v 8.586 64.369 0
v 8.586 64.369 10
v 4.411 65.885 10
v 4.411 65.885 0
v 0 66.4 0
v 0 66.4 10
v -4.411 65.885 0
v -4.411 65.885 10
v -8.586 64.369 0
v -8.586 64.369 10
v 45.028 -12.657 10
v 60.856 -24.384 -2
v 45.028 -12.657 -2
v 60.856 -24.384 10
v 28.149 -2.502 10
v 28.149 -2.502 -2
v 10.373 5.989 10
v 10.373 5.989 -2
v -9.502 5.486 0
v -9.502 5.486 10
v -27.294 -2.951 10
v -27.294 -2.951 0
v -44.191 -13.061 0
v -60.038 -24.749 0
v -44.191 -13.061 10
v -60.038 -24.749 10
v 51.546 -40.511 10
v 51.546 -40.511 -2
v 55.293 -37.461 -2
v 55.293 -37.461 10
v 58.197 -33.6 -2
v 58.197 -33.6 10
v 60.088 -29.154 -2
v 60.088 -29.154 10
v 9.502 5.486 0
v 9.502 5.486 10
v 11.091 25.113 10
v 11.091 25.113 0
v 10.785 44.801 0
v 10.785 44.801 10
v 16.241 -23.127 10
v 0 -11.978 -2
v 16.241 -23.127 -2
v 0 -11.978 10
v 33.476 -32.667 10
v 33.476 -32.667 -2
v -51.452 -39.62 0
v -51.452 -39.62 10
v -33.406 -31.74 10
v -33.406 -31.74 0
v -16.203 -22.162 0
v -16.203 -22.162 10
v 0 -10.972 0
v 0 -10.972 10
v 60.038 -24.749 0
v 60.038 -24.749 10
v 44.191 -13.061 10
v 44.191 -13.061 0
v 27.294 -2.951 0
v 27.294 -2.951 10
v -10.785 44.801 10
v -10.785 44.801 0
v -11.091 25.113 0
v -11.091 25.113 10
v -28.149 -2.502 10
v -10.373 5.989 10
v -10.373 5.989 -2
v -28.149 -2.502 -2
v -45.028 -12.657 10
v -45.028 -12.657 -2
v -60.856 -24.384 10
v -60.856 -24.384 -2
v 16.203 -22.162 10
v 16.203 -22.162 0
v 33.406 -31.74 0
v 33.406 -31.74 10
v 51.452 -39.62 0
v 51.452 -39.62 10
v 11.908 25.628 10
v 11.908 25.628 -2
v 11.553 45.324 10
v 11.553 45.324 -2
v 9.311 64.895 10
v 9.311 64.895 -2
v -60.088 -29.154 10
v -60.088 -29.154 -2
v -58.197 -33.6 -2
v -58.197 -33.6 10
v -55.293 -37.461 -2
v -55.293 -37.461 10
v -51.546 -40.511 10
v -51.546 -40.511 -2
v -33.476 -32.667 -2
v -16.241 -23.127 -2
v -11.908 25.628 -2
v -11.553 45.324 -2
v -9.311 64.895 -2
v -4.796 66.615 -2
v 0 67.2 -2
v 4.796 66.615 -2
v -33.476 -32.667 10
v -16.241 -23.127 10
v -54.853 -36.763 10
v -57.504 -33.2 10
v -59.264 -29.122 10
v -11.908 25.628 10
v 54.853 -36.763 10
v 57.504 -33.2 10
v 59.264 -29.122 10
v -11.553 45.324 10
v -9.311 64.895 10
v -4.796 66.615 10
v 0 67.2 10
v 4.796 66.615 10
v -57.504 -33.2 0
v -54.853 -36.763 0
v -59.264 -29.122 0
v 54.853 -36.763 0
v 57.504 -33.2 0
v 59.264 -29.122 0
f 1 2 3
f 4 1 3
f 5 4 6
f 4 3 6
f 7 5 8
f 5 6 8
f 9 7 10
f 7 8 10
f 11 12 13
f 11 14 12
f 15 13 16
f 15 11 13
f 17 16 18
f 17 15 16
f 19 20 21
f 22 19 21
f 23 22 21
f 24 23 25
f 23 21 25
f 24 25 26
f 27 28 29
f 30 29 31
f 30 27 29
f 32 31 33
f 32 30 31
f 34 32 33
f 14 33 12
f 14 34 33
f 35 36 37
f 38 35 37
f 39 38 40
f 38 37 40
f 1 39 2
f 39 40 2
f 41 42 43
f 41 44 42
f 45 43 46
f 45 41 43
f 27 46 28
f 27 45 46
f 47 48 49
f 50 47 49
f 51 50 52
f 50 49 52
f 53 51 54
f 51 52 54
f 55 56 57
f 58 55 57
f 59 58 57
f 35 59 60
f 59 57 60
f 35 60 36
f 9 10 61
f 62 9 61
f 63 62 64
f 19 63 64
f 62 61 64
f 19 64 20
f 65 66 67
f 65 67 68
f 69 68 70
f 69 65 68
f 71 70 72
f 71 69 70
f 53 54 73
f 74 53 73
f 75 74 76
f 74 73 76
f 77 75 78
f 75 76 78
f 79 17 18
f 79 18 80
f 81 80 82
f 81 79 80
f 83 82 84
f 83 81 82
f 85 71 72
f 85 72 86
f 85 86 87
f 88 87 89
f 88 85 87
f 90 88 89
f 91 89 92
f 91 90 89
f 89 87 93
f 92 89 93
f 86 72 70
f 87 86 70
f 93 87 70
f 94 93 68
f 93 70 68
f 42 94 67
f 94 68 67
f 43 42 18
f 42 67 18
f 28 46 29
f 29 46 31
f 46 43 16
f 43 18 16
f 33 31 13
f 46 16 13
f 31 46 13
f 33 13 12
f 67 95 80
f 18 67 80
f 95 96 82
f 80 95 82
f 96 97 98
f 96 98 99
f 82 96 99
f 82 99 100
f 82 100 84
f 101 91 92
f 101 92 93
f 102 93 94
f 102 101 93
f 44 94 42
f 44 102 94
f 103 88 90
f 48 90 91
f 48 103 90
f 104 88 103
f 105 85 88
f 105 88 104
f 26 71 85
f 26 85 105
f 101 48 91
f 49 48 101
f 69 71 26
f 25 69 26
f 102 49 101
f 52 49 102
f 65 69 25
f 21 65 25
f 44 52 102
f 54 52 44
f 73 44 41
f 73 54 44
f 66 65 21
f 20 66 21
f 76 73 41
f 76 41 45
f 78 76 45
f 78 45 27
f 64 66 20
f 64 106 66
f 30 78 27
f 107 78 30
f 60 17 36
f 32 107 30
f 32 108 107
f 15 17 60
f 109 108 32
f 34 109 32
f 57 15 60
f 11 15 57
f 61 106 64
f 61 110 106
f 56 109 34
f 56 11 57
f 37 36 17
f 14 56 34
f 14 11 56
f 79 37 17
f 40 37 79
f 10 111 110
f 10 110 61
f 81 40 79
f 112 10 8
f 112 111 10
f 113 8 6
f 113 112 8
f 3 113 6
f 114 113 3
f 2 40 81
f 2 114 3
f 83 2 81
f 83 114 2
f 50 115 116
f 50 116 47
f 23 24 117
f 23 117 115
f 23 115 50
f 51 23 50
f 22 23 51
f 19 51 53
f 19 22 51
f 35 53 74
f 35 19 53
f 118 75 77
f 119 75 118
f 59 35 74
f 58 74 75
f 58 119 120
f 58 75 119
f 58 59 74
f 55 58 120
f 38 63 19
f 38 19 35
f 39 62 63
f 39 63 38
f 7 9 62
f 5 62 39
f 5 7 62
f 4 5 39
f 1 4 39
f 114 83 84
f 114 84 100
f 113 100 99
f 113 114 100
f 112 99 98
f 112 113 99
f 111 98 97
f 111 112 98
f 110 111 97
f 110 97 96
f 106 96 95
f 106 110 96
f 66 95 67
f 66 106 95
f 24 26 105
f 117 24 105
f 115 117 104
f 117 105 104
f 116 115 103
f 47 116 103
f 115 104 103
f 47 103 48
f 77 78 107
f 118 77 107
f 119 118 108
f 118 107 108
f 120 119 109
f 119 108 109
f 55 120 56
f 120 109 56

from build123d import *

# Parameters (mm, degrees)
F1_DEPTH = 10
F3_DEPTH = 10
F0_R     = 7.5
F4_DEPTH = 2


with BuildPart() as f1:
    # F0 (on Top) → F1 (new body)
    with BuildSketch(Plane.XY):
        with BuildLine():
            ThreePointArc((60.856366, -24.384369), (36.710284, -7.376819), (10.3731, 5.988912))
            ThreePointArc((10.3731, 5.988912), (11.966629, 35.480448), (9.3107, 64.895344))
            ThreePointArc((9.3107, 64.895344), (0, 67.2), (-9.3107, 64.895344))
            ThreePointArc((-9.3107, 64.895344), (-11.966629, 35.480448), (-10.3731, 5.988912))
            ThreePointArc((-10.3731, 5.988912), (-36.710284, -7.376819), (-60.856366, -24.384369))
            ThreePointArc((-60.856366, -24.384369), (-58.196907, -33.6), (-51.545666, -40.510974))
            ThreePointArc((-51.545666, -40.510974), (-24.743655, -28.103629), (0, -11.977824))
            ThreePointArc((0, -11.977824), (24.743655, -28.103629), (51.545666, -40.510974))
            ThreePointArc((51.545666, -40.510974), (58.196907, -33.6), (60.856366, -24.384369))
        make_face()
        with BuildLine():
            ThreePointArc((-7.5, 63.559028), (0, 65.2), (7.5, 63.559028))
            ThreePointArc((7.5, 63.559028), (9.985947, 34.169463), (8.191847, 4.729565))
            ThreePointArc((8.191847, 4.729565), (34.584597, -8.436648), (58.793733, -25.284323))
            ThreePointArc((58.793733, -25.284323), (56.464856, -32.6), (51.293733, -38.274704))
            ThreePointArc((51.293733, -38.274704), (24.59865, -25.732816), (0, -9.45913))
            ThreePointArc((0, -9.45913), (-24.59865, -25.732816), (-51.293733, -38.274704))
            ThreePointArc((-51.293733, -38.274704), (-56.464856, -32.6), (-58.793733, -25.284323))
            ThreePointArc((-58.793733, -25.284323), (-34.584597, -8.436648), (-8.191847, 4.729565))
            ThreePointArc((-8.191847, 4.729565), (-9.985947, 34.169463), (-7.5, 63.559028))
        make_face(mode=Mode.SUBTRACT)
    extrude(amount=F1_DEPTH)

    # F2 (on face) → F3 (cut)
    with BuildSketch(Plane.XY.offset(10)):
        with BuildLine():
            ThreePointArc((-8.585798, 64.368588), (-11.175251, 34.960479), (-9.502098, 5.486039))
            ThreePointArc((-9.502098, 5.486039), (-35.864289, -7.802188), (-60.037731, -24.748774))
            ThreePointArc((-60.037731, -24.748774), (-57.504087, -33.2), (-51.451933, -39.619813))
            ThreePointArc((-51.451933, -39.619813), (-24.689038, -27.158291), (0, -10.972078))
            ThreePointArc((0, -10.972078), (24.689038, -27.158291), (51.451933, -39.619813))
            ThreePointArc((51.451933, -39.619813), (57.504087, -33.2), (60.037731, -24.748774))
            ThreePointArc((60.037731, -24.748774), (35.864289, -7.802188), (9.502098, 5.486039))
            ThreePointArc((9.502098, 5.486039), (11.175251, 34.960479), (8.585798, 64.368588))
            ThreePointArc((8.585798, 64.368588), (0, 66.4), (-8.585798, 64.368588))
        make_face()
        with BuildLine():
            ThreePointArc((7.5, 63.559028), (9.985947, 34.169463), (8.191847, 4.729565))
            ThreePointArc((8.191847, 4.729565), (34.584597, -8.436648), (58.793733, -25.284323))
            ThreePointArc((58.793733, -25.284323), (56.464856, -32.6), (51.293733, -38.274704))
            ThreePointArc((51.293733, -38.274704), (24.59865, -25.732816), (0, -9.45913))
            ThreePointArc((0, -9.45913), (-24.59865, -25.732816), (-51.293733, -38.274704))
            ThreePointArc((-51.293733, -38.274704), (-56.464856, -32.6), (-58.793733, -25.284323))
            ThreePointArc((-58.793733, -25.284323), (-34.584597, -8.436648), (-8.191847, 4.729565))
            ThreePointArc((-8.191847, 4.729565), (-9.985947, 34.169463), (-7.5, 63.559028))
            ThreePointArc((-7.5, 63.559028), (0, 65.2), (7.5, 63.559028))
        make_face(mode=Mode.SUBTRACT)
    extrude(amount=-F3_DEPTH, mode=Mode.SUBTRACT)

    # F0 (on Top) → F4 (join)
    with BuildSketch(Plane.XY):
        with BuildLine():
            ThreePointArc((60.856366, -24.384369), (36.710284, -7.376819), (10.3731, 5.988912))
            ThreePointArc((10.3731, 5.988912), (11.966629, 35.480448), (9.3107, 64.895344))
            ThreePointArc((9.3107, 64.895344), (0, 67.2), (-9.3107, 64.895344))
            ThreePointArc((-9.3107, 64.895344), (-11.966629, 35.480448), (-10.3731, 5.988912))
            ThreePointArc((-10.3731, 5.988912), (-36.710284, -7.376819), (-60.856366, -24.384369))
            ThreePointArc((-60.856366, -24.384369), (-58.196907, -33.6), (-51.545666, -40.510974))
            ThreePointArc((-51.545666, -40.510974), (-24.743655, -28.103629), (0, -11.977824))
            ThreePointArc((0, -11.977824), (24.743655, -28.103629), (51.545666, -40.510974))
            ThreePointArc((51.545666, -40.510974), (58.196907, -33.6), (60.856366, -24.384369))
        make_face()
        with BuildLine():
            ThreePointArc((-7.5, 63.559028), (0, 65.2), (7.5, 63.559028))
            ThreePointArc((7.5, 63.559028), (9.985947, 34.169463), (8.191847, 4.729565))
            ThreePointArc((8.191847, 4.729565), (34.584597, -8.436648), (58.793733, -25.284323))
            ThreePointArc((58.793733, -25.284323), (56.464856, -32.6), (51.293733, -38.274704))
            ThreePointArc((51.293733, -38.274704), (24.59865, -25.732816), (0, -9.45913))
            ThreePointArc((0, -9.45913), (-24.59865, -25.732816), (-51.293733, -38.274704))
            ThreePointArc((-51.293733, -38.274704), (-56.464856, -32.6), (-58.793733, -25.284323))
            ThreePointArc((-58.793733, -25.284323), (-34.584597, -8.436648), (-8.191847, 4.729565))
            ThreePointArc((-8.191847, 4.729565), (-9.985947, 34.169463), (-7.5, 63.559028))
        make_face(mode=Mode.SUBTRACT)
        with BuildLine():
            ThreePointArc((8.191847, 4.729565), (9.985947, 34.169463), (7.5, 63.559028))
            ThreePointArc((7.5, 63.559028), (0, 65.2), (-7.5, 63.559028))
            ThreePointArc((-7.5, 63.559028), (-9.985947, 34.169463), (-8.191847, 4.729565))
            ThreePointArc((-8.191847, 4.729565), (-34.584597, -8.436648), (-58.793733, -25.284323))
            ThreePointArc((-58.793733, -25.284323), (-56.464856, -32.6), (-51.293733, -38.274704))
            ThreePointArc((-51.293733, -38.274704), (-24.59865, -25.732816), (0, -9.45913))
            ThreePointArc((0, -9.45913), (24.59865, -25.732816), (51.293733, -38.274704))
            ThreePointArc((51.293733, -38.274704), (56.464856, -32.6), (58.793733, -25.284323))
            ThreePointArc((58.793733, -25.284323), (34.584597, -8.436648), (8.191847, 4.729565))
        make_face()
        Circle(F0_R, mode=Mode.SUBTRACT)
        Circle(F0_R)
    extrude(amount=-F4_DEPTH)


solid = f1.part
